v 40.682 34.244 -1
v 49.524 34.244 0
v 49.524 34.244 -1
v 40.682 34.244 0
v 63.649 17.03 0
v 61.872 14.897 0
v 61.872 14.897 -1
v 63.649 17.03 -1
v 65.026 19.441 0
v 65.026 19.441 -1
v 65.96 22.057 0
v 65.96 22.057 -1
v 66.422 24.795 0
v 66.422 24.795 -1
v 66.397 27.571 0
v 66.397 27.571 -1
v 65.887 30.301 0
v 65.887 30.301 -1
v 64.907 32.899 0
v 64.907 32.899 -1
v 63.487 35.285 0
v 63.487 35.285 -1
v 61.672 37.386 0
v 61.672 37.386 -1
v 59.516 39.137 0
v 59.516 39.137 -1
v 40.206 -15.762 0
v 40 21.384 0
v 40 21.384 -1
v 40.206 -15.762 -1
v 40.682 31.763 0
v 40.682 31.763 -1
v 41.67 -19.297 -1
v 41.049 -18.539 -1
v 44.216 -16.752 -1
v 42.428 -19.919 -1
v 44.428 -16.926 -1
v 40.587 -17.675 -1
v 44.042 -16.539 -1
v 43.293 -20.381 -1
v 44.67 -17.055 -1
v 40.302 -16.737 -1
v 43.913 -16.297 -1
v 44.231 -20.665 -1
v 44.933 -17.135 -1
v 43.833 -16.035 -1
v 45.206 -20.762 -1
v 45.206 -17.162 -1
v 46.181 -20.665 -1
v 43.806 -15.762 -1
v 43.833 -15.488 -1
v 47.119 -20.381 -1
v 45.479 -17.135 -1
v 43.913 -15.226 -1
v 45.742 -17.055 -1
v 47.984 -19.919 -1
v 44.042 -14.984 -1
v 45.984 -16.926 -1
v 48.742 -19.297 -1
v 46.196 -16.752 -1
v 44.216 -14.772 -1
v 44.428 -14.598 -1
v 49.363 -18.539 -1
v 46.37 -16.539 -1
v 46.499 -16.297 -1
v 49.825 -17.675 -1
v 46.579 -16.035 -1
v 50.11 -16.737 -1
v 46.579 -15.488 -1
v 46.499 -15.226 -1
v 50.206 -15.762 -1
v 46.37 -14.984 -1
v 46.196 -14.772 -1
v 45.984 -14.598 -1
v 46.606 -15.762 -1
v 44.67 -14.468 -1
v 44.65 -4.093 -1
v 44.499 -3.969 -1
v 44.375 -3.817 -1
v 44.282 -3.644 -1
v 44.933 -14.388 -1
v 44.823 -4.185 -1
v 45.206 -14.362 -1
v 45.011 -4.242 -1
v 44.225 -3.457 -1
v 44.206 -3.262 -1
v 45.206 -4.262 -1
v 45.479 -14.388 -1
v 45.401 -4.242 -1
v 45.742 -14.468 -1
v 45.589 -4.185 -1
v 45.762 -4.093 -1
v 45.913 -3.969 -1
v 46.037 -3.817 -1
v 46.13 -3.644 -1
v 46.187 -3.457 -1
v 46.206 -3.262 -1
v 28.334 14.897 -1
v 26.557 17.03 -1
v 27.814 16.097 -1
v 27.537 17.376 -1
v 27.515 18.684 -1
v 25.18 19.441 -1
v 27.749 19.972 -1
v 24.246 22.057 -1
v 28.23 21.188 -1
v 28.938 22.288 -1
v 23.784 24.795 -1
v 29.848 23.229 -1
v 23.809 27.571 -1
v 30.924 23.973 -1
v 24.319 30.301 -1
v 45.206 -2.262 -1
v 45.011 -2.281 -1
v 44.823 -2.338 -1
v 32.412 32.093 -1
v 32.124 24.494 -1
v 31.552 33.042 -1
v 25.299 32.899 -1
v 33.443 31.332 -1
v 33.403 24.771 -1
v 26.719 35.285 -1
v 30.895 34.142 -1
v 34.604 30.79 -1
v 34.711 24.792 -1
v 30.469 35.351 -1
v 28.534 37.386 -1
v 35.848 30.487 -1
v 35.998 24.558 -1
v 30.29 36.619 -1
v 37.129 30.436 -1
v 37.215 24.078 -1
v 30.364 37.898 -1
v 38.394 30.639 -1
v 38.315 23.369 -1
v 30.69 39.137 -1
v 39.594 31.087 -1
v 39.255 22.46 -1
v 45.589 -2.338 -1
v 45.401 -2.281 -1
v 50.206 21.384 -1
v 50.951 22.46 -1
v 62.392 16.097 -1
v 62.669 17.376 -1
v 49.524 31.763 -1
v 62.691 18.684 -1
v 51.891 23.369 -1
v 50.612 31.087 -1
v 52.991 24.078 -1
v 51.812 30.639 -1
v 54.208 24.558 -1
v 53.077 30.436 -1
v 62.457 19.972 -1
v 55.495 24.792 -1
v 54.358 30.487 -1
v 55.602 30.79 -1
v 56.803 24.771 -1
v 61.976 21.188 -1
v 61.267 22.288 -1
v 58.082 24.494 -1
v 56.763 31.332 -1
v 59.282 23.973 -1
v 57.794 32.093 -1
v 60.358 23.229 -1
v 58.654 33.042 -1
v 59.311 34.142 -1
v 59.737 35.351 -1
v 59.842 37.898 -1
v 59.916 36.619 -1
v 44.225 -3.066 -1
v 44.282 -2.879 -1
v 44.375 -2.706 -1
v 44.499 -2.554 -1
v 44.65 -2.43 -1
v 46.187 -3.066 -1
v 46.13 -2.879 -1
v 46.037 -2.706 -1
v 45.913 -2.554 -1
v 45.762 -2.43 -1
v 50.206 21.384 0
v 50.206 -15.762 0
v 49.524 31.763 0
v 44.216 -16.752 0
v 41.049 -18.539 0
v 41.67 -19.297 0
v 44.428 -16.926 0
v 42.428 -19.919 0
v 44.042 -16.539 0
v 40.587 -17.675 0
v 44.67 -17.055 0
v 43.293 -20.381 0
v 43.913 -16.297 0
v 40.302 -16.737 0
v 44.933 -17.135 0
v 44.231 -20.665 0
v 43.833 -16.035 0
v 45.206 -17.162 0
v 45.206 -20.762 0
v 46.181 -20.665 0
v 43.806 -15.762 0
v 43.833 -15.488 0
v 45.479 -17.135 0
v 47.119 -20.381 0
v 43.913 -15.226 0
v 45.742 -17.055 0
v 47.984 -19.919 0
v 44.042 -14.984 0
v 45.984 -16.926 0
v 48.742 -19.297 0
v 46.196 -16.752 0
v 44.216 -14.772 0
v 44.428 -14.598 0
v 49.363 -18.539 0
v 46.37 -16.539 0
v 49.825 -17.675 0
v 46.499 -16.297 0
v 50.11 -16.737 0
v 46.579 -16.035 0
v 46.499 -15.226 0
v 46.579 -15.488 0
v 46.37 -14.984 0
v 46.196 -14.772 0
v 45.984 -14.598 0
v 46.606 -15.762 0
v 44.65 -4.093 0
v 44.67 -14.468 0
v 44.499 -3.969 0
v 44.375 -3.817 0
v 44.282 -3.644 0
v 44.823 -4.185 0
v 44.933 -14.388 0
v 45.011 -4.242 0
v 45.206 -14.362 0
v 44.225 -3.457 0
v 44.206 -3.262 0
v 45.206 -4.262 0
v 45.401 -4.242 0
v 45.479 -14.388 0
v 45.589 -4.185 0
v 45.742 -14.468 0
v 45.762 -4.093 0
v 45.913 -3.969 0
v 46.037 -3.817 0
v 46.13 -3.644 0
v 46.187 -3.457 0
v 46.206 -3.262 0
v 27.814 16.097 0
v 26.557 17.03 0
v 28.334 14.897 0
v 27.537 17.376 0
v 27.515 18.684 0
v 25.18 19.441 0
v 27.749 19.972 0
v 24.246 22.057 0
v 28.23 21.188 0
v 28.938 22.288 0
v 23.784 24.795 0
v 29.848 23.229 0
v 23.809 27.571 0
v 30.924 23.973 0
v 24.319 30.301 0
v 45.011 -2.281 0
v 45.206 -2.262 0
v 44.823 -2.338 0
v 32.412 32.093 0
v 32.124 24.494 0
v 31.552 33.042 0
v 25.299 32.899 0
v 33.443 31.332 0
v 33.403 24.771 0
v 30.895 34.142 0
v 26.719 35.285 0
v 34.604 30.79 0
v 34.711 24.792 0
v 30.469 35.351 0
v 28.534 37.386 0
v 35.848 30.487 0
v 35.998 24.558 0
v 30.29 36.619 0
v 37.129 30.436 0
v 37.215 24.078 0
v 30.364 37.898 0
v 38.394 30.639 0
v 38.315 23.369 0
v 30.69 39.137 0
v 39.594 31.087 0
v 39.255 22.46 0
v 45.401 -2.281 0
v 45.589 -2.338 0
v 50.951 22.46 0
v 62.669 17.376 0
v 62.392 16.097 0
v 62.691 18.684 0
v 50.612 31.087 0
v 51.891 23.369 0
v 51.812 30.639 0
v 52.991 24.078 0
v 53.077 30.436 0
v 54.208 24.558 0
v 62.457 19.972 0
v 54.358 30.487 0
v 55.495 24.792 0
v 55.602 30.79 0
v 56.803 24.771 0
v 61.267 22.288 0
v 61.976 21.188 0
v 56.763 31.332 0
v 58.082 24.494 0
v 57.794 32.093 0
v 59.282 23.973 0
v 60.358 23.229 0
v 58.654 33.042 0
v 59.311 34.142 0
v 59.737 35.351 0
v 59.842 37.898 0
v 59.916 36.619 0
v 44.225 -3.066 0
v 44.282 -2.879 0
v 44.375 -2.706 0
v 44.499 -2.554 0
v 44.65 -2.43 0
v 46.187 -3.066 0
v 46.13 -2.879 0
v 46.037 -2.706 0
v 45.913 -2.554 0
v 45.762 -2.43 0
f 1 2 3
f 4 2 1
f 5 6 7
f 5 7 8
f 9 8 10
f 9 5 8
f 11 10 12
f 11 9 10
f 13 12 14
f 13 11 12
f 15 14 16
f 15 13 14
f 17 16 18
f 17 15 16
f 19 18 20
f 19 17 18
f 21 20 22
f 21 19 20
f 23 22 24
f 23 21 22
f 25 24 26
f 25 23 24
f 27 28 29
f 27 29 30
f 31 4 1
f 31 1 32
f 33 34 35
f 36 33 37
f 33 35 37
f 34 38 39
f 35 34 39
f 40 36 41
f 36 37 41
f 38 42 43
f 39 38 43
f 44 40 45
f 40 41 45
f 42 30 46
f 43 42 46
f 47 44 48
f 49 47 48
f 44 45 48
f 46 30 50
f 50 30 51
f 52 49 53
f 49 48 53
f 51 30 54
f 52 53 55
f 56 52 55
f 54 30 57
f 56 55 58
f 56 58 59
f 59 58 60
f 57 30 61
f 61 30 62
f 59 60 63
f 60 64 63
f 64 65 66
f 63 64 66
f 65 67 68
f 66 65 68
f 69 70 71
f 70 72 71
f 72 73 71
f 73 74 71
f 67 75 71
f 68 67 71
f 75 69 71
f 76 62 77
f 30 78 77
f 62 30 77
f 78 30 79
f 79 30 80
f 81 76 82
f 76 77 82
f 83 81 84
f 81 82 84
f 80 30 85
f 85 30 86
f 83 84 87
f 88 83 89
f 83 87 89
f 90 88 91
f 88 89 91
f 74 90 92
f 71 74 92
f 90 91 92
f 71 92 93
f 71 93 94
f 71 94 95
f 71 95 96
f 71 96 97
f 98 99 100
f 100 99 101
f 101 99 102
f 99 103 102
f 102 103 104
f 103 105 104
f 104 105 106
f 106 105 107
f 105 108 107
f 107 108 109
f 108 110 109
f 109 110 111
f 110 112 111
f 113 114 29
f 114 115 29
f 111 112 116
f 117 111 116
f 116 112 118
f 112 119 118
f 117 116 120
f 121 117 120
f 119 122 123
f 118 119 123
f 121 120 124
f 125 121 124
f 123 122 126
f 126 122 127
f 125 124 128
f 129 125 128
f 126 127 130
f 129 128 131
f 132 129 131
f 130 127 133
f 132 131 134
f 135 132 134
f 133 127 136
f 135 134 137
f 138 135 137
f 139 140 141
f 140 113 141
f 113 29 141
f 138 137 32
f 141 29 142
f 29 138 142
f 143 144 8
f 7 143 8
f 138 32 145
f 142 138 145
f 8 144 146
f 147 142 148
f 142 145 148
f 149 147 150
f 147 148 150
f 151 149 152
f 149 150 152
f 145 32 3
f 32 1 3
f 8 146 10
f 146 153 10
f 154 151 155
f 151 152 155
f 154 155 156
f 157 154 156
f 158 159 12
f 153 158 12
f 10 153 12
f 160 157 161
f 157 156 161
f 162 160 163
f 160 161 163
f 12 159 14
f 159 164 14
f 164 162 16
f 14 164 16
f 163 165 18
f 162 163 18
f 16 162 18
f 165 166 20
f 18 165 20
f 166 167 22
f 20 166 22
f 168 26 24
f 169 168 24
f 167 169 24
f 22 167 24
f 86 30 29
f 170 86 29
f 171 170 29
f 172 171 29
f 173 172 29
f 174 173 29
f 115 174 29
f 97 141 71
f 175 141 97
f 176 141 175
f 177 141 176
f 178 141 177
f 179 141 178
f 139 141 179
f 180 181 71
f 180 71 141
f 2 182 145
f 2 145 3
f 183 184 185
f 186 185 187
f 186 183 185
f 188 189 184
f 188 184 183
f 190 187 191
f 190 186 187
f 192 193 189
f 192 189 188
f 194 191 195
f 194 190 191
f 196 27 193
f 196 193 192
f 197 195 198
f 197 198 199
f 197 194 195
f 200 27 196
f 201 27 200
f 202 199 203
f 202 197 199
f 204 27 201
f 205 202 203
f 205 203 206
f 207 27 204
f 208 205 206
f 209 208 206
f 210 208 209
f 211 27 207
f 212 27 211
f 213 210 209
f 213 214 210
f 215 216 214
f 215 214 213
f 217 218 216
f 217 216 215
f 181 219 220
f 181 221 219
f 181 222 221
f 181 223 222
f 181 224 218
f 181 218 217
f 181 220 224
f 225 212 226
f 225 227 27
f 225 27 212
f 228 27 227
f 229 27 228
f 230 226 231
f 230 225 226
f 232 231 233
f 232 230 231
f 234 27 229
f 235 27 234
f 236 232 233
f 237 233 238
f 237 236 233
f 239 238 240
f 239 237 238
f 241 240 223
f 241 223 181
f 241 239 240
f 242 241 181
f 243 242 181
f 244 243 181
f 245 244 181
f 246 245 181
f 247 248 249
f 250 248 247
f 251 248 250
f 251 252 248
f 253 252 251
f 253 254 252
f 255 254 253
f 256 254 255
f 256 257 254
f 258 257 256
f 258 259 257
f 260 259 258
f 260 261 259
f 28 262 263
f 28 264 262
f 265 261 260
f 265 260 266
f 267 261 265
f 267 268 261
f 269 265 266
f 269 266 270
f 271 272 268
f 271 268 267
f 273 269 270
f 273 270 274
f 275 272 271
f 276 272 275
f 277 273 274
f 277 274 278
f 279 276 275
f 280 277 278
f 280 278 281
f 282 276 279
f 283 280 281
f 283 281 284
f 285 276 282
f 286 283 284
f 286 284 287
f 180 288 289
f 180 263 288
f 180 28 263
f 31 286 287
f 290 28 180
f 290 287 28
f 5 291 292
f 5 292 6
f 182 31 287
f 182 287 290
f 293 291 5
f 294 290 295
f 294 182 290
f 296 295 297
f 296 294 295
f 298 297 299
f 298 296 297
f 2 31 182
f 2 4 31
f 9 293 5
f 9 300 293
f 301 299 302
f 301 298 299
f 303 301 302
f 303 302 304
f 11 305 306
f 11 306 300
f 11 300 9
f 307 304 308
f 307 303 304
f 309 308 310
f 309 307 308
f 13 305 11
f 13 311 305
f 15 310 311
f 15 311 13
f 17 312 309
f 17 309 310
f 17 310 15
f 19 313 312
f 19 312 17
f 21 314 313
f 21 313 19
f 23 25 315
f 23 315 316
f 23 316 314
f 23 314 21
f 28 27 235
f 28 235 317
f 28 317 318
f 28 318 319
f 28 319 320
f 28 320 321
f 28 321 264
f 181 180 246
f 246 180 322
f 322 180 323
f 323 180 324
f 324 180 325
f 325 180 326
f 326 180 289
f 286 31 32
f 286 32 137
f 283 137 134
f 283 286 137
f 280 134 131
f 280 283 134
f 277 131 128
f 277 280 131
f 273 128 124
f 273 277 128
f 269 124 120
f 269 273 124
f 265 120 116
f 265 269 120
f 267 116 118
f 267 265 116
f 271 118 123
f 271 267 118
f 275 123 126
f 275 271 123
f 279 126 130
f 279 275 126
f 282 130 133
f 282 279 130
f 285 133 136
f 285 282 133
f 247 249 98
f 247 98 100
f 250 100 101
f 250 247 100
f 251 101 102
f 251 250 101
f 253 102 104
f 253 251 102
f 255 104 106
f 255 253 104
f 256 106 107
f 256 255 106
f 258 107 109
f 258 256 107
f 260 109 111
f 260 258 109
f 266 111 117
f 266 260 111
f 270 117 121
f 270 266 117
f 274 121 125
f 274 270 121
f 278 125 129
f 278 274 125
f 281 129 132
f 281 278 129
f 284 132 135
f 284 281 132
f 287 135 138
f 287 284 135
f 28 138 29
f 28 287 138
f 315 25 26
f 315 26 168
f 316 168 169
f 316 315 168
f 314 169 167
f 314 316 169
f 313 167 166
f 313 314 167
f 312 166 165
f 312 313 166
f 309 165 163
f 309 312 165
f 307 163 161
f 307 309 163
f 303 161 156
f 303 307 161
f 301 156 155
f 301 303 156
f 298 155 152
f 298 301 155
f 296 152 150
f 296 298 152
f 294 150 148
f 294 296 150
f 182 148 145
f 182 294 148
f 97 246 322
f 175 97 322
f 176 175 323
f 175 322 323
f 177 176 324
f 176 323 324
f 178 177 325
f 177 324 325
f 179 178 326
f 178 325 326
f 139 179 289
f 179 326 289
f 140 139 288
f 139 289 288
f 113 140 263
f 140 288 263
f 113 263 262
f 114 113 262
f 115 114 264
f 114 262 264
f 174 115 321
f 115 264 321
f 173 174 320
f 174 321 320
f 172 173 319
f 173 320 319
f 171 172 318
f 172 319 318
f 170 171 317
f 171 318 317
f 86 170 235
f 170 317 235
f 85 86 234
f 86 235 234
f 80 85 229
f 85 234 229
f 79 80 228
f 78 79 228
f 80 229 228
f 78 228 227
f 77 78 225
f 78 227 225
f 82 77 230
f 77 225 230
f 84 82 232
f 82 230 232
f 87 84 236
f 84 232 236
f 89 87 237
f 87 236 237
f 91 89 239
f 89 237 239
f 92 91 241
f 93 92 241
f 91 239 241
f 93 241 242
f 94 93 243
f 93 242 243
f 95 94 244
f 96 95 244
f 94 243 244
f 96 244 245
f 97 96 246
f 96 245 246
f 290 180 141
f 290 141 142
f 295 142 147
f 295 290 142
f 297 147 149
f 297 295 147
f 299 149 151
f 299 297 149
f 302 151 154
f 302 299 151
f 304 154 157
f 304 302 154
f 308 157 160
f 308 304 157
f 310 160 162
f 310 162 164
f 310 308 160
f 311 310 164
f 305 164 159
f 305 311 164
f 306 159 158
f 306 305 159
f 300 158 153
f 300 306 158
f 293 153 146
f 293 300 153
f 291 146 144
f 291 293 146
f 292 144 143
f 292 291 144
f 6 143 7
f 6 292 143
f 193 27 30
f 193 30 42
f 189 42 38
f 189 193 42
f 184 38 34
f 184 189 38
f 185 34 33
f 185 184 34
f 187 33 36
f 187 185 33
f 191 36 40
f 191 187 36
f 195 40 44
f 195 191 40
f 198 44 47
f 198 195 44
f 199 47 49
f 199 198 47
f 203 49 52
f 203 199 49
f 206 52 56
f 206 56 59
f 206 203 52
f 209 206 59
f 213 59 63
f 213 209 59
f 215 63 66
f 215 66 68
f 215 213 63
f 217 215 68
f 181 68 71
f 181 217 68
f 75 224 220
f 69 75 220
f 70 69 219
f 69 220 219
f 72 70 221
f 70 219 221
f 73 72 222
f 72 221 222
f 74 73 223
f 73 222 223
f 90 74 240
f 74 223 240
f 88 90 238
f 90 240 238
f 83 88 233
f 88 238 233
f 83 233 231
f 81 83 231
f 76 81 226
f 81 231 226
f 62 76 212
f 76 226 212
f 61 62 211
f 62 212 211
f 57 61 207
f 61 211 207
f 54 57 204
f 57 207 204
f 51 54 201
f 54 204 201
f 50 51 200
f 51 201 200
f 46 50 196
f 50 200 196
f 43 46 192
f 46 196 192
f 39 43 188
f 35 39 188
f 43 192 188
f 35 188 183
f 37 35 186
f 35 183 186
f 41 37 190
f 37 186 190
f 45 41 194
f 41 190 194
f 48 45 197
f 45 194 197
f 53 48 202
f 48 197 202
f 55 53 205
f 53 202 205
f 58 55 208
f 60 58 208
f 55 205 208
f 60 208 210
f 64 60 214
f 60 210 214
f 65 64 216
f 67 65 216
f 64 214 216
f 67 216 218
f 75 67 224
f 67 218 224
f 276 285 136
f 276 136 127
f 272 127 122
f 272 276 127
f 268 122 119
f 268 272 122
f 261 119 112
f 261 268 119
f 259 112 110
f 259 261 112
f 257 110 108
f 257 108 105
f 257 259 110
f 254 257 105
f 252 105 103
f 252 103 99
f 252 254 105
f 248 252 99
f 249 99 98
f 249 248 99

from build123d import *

# Parameters (mm, degrees)
MODEL_R           = 1.4
MODEL_R_2         = 1
BRIDA_BASE1_DEPTH = 1


# Sheet-metal steps are written as plain solids
with BuildPart() as part:
    # Model → Brida base1 (new body)
    with BuildSketch(Plane.XY):
        with BuildLine():
            Line((40, 21.38389001), (40.2059904, -15.761563617))
            ThreePointArc((40.2059904, -15.761563617), (45.205990408, -20.761561608), (50.205990416, -15.761563617))
            Line((50.205990416, -15.761563617), (50.205990416, 21.38389001))
            ThreePointArc((50.205990416, 21.38389001), (59.282249533, 23.973347274), (61.871706797, 14.897088157))
            ThreePointArc((61.871706797, 14.897088157), (66.397009574, 27.571280603), (59.516453931, 39.13724245))
            ThreePointArc((59.516453931, 39.13724245), (57.297457404, 31.686860899), (49.524022567, 31.763291841))
            Line((49.524022567, 31.763291841), (49.524022567, 34.243690175))
            Line((49.524022567, 34.243690175), (40.681967849, 34.243690175))
            Line((40.681967849, 34.243690175), (40.681967849, 31.763291841))
            ThreePointArc((40.681967849, 31.763291841), (32.908533012, 31.686860899), (30.689536484, 39.13724245))
            ThreePointArc((30.689536484, 39.13724245), (23.808980842, 27.571280603), (28.334283619, 14.897088157))
            ThreePointArc((28.334283619, 14.897088157), (30.923740883, 23.973347274), (40, 21.38389001))
        make_face()
        with Locations((45.205990408, -15.7615616)):
            Circle(MODEL_R, mode=Mode.SUBTRACT)
        with Locations((45.205990408, -3.2615616)):
            Circle(MODEL_R_2, mode=Mode.SUBTRACT)
    extrude(amount=-BRIDA_BASE1_DEPTH)


solid = part.part
